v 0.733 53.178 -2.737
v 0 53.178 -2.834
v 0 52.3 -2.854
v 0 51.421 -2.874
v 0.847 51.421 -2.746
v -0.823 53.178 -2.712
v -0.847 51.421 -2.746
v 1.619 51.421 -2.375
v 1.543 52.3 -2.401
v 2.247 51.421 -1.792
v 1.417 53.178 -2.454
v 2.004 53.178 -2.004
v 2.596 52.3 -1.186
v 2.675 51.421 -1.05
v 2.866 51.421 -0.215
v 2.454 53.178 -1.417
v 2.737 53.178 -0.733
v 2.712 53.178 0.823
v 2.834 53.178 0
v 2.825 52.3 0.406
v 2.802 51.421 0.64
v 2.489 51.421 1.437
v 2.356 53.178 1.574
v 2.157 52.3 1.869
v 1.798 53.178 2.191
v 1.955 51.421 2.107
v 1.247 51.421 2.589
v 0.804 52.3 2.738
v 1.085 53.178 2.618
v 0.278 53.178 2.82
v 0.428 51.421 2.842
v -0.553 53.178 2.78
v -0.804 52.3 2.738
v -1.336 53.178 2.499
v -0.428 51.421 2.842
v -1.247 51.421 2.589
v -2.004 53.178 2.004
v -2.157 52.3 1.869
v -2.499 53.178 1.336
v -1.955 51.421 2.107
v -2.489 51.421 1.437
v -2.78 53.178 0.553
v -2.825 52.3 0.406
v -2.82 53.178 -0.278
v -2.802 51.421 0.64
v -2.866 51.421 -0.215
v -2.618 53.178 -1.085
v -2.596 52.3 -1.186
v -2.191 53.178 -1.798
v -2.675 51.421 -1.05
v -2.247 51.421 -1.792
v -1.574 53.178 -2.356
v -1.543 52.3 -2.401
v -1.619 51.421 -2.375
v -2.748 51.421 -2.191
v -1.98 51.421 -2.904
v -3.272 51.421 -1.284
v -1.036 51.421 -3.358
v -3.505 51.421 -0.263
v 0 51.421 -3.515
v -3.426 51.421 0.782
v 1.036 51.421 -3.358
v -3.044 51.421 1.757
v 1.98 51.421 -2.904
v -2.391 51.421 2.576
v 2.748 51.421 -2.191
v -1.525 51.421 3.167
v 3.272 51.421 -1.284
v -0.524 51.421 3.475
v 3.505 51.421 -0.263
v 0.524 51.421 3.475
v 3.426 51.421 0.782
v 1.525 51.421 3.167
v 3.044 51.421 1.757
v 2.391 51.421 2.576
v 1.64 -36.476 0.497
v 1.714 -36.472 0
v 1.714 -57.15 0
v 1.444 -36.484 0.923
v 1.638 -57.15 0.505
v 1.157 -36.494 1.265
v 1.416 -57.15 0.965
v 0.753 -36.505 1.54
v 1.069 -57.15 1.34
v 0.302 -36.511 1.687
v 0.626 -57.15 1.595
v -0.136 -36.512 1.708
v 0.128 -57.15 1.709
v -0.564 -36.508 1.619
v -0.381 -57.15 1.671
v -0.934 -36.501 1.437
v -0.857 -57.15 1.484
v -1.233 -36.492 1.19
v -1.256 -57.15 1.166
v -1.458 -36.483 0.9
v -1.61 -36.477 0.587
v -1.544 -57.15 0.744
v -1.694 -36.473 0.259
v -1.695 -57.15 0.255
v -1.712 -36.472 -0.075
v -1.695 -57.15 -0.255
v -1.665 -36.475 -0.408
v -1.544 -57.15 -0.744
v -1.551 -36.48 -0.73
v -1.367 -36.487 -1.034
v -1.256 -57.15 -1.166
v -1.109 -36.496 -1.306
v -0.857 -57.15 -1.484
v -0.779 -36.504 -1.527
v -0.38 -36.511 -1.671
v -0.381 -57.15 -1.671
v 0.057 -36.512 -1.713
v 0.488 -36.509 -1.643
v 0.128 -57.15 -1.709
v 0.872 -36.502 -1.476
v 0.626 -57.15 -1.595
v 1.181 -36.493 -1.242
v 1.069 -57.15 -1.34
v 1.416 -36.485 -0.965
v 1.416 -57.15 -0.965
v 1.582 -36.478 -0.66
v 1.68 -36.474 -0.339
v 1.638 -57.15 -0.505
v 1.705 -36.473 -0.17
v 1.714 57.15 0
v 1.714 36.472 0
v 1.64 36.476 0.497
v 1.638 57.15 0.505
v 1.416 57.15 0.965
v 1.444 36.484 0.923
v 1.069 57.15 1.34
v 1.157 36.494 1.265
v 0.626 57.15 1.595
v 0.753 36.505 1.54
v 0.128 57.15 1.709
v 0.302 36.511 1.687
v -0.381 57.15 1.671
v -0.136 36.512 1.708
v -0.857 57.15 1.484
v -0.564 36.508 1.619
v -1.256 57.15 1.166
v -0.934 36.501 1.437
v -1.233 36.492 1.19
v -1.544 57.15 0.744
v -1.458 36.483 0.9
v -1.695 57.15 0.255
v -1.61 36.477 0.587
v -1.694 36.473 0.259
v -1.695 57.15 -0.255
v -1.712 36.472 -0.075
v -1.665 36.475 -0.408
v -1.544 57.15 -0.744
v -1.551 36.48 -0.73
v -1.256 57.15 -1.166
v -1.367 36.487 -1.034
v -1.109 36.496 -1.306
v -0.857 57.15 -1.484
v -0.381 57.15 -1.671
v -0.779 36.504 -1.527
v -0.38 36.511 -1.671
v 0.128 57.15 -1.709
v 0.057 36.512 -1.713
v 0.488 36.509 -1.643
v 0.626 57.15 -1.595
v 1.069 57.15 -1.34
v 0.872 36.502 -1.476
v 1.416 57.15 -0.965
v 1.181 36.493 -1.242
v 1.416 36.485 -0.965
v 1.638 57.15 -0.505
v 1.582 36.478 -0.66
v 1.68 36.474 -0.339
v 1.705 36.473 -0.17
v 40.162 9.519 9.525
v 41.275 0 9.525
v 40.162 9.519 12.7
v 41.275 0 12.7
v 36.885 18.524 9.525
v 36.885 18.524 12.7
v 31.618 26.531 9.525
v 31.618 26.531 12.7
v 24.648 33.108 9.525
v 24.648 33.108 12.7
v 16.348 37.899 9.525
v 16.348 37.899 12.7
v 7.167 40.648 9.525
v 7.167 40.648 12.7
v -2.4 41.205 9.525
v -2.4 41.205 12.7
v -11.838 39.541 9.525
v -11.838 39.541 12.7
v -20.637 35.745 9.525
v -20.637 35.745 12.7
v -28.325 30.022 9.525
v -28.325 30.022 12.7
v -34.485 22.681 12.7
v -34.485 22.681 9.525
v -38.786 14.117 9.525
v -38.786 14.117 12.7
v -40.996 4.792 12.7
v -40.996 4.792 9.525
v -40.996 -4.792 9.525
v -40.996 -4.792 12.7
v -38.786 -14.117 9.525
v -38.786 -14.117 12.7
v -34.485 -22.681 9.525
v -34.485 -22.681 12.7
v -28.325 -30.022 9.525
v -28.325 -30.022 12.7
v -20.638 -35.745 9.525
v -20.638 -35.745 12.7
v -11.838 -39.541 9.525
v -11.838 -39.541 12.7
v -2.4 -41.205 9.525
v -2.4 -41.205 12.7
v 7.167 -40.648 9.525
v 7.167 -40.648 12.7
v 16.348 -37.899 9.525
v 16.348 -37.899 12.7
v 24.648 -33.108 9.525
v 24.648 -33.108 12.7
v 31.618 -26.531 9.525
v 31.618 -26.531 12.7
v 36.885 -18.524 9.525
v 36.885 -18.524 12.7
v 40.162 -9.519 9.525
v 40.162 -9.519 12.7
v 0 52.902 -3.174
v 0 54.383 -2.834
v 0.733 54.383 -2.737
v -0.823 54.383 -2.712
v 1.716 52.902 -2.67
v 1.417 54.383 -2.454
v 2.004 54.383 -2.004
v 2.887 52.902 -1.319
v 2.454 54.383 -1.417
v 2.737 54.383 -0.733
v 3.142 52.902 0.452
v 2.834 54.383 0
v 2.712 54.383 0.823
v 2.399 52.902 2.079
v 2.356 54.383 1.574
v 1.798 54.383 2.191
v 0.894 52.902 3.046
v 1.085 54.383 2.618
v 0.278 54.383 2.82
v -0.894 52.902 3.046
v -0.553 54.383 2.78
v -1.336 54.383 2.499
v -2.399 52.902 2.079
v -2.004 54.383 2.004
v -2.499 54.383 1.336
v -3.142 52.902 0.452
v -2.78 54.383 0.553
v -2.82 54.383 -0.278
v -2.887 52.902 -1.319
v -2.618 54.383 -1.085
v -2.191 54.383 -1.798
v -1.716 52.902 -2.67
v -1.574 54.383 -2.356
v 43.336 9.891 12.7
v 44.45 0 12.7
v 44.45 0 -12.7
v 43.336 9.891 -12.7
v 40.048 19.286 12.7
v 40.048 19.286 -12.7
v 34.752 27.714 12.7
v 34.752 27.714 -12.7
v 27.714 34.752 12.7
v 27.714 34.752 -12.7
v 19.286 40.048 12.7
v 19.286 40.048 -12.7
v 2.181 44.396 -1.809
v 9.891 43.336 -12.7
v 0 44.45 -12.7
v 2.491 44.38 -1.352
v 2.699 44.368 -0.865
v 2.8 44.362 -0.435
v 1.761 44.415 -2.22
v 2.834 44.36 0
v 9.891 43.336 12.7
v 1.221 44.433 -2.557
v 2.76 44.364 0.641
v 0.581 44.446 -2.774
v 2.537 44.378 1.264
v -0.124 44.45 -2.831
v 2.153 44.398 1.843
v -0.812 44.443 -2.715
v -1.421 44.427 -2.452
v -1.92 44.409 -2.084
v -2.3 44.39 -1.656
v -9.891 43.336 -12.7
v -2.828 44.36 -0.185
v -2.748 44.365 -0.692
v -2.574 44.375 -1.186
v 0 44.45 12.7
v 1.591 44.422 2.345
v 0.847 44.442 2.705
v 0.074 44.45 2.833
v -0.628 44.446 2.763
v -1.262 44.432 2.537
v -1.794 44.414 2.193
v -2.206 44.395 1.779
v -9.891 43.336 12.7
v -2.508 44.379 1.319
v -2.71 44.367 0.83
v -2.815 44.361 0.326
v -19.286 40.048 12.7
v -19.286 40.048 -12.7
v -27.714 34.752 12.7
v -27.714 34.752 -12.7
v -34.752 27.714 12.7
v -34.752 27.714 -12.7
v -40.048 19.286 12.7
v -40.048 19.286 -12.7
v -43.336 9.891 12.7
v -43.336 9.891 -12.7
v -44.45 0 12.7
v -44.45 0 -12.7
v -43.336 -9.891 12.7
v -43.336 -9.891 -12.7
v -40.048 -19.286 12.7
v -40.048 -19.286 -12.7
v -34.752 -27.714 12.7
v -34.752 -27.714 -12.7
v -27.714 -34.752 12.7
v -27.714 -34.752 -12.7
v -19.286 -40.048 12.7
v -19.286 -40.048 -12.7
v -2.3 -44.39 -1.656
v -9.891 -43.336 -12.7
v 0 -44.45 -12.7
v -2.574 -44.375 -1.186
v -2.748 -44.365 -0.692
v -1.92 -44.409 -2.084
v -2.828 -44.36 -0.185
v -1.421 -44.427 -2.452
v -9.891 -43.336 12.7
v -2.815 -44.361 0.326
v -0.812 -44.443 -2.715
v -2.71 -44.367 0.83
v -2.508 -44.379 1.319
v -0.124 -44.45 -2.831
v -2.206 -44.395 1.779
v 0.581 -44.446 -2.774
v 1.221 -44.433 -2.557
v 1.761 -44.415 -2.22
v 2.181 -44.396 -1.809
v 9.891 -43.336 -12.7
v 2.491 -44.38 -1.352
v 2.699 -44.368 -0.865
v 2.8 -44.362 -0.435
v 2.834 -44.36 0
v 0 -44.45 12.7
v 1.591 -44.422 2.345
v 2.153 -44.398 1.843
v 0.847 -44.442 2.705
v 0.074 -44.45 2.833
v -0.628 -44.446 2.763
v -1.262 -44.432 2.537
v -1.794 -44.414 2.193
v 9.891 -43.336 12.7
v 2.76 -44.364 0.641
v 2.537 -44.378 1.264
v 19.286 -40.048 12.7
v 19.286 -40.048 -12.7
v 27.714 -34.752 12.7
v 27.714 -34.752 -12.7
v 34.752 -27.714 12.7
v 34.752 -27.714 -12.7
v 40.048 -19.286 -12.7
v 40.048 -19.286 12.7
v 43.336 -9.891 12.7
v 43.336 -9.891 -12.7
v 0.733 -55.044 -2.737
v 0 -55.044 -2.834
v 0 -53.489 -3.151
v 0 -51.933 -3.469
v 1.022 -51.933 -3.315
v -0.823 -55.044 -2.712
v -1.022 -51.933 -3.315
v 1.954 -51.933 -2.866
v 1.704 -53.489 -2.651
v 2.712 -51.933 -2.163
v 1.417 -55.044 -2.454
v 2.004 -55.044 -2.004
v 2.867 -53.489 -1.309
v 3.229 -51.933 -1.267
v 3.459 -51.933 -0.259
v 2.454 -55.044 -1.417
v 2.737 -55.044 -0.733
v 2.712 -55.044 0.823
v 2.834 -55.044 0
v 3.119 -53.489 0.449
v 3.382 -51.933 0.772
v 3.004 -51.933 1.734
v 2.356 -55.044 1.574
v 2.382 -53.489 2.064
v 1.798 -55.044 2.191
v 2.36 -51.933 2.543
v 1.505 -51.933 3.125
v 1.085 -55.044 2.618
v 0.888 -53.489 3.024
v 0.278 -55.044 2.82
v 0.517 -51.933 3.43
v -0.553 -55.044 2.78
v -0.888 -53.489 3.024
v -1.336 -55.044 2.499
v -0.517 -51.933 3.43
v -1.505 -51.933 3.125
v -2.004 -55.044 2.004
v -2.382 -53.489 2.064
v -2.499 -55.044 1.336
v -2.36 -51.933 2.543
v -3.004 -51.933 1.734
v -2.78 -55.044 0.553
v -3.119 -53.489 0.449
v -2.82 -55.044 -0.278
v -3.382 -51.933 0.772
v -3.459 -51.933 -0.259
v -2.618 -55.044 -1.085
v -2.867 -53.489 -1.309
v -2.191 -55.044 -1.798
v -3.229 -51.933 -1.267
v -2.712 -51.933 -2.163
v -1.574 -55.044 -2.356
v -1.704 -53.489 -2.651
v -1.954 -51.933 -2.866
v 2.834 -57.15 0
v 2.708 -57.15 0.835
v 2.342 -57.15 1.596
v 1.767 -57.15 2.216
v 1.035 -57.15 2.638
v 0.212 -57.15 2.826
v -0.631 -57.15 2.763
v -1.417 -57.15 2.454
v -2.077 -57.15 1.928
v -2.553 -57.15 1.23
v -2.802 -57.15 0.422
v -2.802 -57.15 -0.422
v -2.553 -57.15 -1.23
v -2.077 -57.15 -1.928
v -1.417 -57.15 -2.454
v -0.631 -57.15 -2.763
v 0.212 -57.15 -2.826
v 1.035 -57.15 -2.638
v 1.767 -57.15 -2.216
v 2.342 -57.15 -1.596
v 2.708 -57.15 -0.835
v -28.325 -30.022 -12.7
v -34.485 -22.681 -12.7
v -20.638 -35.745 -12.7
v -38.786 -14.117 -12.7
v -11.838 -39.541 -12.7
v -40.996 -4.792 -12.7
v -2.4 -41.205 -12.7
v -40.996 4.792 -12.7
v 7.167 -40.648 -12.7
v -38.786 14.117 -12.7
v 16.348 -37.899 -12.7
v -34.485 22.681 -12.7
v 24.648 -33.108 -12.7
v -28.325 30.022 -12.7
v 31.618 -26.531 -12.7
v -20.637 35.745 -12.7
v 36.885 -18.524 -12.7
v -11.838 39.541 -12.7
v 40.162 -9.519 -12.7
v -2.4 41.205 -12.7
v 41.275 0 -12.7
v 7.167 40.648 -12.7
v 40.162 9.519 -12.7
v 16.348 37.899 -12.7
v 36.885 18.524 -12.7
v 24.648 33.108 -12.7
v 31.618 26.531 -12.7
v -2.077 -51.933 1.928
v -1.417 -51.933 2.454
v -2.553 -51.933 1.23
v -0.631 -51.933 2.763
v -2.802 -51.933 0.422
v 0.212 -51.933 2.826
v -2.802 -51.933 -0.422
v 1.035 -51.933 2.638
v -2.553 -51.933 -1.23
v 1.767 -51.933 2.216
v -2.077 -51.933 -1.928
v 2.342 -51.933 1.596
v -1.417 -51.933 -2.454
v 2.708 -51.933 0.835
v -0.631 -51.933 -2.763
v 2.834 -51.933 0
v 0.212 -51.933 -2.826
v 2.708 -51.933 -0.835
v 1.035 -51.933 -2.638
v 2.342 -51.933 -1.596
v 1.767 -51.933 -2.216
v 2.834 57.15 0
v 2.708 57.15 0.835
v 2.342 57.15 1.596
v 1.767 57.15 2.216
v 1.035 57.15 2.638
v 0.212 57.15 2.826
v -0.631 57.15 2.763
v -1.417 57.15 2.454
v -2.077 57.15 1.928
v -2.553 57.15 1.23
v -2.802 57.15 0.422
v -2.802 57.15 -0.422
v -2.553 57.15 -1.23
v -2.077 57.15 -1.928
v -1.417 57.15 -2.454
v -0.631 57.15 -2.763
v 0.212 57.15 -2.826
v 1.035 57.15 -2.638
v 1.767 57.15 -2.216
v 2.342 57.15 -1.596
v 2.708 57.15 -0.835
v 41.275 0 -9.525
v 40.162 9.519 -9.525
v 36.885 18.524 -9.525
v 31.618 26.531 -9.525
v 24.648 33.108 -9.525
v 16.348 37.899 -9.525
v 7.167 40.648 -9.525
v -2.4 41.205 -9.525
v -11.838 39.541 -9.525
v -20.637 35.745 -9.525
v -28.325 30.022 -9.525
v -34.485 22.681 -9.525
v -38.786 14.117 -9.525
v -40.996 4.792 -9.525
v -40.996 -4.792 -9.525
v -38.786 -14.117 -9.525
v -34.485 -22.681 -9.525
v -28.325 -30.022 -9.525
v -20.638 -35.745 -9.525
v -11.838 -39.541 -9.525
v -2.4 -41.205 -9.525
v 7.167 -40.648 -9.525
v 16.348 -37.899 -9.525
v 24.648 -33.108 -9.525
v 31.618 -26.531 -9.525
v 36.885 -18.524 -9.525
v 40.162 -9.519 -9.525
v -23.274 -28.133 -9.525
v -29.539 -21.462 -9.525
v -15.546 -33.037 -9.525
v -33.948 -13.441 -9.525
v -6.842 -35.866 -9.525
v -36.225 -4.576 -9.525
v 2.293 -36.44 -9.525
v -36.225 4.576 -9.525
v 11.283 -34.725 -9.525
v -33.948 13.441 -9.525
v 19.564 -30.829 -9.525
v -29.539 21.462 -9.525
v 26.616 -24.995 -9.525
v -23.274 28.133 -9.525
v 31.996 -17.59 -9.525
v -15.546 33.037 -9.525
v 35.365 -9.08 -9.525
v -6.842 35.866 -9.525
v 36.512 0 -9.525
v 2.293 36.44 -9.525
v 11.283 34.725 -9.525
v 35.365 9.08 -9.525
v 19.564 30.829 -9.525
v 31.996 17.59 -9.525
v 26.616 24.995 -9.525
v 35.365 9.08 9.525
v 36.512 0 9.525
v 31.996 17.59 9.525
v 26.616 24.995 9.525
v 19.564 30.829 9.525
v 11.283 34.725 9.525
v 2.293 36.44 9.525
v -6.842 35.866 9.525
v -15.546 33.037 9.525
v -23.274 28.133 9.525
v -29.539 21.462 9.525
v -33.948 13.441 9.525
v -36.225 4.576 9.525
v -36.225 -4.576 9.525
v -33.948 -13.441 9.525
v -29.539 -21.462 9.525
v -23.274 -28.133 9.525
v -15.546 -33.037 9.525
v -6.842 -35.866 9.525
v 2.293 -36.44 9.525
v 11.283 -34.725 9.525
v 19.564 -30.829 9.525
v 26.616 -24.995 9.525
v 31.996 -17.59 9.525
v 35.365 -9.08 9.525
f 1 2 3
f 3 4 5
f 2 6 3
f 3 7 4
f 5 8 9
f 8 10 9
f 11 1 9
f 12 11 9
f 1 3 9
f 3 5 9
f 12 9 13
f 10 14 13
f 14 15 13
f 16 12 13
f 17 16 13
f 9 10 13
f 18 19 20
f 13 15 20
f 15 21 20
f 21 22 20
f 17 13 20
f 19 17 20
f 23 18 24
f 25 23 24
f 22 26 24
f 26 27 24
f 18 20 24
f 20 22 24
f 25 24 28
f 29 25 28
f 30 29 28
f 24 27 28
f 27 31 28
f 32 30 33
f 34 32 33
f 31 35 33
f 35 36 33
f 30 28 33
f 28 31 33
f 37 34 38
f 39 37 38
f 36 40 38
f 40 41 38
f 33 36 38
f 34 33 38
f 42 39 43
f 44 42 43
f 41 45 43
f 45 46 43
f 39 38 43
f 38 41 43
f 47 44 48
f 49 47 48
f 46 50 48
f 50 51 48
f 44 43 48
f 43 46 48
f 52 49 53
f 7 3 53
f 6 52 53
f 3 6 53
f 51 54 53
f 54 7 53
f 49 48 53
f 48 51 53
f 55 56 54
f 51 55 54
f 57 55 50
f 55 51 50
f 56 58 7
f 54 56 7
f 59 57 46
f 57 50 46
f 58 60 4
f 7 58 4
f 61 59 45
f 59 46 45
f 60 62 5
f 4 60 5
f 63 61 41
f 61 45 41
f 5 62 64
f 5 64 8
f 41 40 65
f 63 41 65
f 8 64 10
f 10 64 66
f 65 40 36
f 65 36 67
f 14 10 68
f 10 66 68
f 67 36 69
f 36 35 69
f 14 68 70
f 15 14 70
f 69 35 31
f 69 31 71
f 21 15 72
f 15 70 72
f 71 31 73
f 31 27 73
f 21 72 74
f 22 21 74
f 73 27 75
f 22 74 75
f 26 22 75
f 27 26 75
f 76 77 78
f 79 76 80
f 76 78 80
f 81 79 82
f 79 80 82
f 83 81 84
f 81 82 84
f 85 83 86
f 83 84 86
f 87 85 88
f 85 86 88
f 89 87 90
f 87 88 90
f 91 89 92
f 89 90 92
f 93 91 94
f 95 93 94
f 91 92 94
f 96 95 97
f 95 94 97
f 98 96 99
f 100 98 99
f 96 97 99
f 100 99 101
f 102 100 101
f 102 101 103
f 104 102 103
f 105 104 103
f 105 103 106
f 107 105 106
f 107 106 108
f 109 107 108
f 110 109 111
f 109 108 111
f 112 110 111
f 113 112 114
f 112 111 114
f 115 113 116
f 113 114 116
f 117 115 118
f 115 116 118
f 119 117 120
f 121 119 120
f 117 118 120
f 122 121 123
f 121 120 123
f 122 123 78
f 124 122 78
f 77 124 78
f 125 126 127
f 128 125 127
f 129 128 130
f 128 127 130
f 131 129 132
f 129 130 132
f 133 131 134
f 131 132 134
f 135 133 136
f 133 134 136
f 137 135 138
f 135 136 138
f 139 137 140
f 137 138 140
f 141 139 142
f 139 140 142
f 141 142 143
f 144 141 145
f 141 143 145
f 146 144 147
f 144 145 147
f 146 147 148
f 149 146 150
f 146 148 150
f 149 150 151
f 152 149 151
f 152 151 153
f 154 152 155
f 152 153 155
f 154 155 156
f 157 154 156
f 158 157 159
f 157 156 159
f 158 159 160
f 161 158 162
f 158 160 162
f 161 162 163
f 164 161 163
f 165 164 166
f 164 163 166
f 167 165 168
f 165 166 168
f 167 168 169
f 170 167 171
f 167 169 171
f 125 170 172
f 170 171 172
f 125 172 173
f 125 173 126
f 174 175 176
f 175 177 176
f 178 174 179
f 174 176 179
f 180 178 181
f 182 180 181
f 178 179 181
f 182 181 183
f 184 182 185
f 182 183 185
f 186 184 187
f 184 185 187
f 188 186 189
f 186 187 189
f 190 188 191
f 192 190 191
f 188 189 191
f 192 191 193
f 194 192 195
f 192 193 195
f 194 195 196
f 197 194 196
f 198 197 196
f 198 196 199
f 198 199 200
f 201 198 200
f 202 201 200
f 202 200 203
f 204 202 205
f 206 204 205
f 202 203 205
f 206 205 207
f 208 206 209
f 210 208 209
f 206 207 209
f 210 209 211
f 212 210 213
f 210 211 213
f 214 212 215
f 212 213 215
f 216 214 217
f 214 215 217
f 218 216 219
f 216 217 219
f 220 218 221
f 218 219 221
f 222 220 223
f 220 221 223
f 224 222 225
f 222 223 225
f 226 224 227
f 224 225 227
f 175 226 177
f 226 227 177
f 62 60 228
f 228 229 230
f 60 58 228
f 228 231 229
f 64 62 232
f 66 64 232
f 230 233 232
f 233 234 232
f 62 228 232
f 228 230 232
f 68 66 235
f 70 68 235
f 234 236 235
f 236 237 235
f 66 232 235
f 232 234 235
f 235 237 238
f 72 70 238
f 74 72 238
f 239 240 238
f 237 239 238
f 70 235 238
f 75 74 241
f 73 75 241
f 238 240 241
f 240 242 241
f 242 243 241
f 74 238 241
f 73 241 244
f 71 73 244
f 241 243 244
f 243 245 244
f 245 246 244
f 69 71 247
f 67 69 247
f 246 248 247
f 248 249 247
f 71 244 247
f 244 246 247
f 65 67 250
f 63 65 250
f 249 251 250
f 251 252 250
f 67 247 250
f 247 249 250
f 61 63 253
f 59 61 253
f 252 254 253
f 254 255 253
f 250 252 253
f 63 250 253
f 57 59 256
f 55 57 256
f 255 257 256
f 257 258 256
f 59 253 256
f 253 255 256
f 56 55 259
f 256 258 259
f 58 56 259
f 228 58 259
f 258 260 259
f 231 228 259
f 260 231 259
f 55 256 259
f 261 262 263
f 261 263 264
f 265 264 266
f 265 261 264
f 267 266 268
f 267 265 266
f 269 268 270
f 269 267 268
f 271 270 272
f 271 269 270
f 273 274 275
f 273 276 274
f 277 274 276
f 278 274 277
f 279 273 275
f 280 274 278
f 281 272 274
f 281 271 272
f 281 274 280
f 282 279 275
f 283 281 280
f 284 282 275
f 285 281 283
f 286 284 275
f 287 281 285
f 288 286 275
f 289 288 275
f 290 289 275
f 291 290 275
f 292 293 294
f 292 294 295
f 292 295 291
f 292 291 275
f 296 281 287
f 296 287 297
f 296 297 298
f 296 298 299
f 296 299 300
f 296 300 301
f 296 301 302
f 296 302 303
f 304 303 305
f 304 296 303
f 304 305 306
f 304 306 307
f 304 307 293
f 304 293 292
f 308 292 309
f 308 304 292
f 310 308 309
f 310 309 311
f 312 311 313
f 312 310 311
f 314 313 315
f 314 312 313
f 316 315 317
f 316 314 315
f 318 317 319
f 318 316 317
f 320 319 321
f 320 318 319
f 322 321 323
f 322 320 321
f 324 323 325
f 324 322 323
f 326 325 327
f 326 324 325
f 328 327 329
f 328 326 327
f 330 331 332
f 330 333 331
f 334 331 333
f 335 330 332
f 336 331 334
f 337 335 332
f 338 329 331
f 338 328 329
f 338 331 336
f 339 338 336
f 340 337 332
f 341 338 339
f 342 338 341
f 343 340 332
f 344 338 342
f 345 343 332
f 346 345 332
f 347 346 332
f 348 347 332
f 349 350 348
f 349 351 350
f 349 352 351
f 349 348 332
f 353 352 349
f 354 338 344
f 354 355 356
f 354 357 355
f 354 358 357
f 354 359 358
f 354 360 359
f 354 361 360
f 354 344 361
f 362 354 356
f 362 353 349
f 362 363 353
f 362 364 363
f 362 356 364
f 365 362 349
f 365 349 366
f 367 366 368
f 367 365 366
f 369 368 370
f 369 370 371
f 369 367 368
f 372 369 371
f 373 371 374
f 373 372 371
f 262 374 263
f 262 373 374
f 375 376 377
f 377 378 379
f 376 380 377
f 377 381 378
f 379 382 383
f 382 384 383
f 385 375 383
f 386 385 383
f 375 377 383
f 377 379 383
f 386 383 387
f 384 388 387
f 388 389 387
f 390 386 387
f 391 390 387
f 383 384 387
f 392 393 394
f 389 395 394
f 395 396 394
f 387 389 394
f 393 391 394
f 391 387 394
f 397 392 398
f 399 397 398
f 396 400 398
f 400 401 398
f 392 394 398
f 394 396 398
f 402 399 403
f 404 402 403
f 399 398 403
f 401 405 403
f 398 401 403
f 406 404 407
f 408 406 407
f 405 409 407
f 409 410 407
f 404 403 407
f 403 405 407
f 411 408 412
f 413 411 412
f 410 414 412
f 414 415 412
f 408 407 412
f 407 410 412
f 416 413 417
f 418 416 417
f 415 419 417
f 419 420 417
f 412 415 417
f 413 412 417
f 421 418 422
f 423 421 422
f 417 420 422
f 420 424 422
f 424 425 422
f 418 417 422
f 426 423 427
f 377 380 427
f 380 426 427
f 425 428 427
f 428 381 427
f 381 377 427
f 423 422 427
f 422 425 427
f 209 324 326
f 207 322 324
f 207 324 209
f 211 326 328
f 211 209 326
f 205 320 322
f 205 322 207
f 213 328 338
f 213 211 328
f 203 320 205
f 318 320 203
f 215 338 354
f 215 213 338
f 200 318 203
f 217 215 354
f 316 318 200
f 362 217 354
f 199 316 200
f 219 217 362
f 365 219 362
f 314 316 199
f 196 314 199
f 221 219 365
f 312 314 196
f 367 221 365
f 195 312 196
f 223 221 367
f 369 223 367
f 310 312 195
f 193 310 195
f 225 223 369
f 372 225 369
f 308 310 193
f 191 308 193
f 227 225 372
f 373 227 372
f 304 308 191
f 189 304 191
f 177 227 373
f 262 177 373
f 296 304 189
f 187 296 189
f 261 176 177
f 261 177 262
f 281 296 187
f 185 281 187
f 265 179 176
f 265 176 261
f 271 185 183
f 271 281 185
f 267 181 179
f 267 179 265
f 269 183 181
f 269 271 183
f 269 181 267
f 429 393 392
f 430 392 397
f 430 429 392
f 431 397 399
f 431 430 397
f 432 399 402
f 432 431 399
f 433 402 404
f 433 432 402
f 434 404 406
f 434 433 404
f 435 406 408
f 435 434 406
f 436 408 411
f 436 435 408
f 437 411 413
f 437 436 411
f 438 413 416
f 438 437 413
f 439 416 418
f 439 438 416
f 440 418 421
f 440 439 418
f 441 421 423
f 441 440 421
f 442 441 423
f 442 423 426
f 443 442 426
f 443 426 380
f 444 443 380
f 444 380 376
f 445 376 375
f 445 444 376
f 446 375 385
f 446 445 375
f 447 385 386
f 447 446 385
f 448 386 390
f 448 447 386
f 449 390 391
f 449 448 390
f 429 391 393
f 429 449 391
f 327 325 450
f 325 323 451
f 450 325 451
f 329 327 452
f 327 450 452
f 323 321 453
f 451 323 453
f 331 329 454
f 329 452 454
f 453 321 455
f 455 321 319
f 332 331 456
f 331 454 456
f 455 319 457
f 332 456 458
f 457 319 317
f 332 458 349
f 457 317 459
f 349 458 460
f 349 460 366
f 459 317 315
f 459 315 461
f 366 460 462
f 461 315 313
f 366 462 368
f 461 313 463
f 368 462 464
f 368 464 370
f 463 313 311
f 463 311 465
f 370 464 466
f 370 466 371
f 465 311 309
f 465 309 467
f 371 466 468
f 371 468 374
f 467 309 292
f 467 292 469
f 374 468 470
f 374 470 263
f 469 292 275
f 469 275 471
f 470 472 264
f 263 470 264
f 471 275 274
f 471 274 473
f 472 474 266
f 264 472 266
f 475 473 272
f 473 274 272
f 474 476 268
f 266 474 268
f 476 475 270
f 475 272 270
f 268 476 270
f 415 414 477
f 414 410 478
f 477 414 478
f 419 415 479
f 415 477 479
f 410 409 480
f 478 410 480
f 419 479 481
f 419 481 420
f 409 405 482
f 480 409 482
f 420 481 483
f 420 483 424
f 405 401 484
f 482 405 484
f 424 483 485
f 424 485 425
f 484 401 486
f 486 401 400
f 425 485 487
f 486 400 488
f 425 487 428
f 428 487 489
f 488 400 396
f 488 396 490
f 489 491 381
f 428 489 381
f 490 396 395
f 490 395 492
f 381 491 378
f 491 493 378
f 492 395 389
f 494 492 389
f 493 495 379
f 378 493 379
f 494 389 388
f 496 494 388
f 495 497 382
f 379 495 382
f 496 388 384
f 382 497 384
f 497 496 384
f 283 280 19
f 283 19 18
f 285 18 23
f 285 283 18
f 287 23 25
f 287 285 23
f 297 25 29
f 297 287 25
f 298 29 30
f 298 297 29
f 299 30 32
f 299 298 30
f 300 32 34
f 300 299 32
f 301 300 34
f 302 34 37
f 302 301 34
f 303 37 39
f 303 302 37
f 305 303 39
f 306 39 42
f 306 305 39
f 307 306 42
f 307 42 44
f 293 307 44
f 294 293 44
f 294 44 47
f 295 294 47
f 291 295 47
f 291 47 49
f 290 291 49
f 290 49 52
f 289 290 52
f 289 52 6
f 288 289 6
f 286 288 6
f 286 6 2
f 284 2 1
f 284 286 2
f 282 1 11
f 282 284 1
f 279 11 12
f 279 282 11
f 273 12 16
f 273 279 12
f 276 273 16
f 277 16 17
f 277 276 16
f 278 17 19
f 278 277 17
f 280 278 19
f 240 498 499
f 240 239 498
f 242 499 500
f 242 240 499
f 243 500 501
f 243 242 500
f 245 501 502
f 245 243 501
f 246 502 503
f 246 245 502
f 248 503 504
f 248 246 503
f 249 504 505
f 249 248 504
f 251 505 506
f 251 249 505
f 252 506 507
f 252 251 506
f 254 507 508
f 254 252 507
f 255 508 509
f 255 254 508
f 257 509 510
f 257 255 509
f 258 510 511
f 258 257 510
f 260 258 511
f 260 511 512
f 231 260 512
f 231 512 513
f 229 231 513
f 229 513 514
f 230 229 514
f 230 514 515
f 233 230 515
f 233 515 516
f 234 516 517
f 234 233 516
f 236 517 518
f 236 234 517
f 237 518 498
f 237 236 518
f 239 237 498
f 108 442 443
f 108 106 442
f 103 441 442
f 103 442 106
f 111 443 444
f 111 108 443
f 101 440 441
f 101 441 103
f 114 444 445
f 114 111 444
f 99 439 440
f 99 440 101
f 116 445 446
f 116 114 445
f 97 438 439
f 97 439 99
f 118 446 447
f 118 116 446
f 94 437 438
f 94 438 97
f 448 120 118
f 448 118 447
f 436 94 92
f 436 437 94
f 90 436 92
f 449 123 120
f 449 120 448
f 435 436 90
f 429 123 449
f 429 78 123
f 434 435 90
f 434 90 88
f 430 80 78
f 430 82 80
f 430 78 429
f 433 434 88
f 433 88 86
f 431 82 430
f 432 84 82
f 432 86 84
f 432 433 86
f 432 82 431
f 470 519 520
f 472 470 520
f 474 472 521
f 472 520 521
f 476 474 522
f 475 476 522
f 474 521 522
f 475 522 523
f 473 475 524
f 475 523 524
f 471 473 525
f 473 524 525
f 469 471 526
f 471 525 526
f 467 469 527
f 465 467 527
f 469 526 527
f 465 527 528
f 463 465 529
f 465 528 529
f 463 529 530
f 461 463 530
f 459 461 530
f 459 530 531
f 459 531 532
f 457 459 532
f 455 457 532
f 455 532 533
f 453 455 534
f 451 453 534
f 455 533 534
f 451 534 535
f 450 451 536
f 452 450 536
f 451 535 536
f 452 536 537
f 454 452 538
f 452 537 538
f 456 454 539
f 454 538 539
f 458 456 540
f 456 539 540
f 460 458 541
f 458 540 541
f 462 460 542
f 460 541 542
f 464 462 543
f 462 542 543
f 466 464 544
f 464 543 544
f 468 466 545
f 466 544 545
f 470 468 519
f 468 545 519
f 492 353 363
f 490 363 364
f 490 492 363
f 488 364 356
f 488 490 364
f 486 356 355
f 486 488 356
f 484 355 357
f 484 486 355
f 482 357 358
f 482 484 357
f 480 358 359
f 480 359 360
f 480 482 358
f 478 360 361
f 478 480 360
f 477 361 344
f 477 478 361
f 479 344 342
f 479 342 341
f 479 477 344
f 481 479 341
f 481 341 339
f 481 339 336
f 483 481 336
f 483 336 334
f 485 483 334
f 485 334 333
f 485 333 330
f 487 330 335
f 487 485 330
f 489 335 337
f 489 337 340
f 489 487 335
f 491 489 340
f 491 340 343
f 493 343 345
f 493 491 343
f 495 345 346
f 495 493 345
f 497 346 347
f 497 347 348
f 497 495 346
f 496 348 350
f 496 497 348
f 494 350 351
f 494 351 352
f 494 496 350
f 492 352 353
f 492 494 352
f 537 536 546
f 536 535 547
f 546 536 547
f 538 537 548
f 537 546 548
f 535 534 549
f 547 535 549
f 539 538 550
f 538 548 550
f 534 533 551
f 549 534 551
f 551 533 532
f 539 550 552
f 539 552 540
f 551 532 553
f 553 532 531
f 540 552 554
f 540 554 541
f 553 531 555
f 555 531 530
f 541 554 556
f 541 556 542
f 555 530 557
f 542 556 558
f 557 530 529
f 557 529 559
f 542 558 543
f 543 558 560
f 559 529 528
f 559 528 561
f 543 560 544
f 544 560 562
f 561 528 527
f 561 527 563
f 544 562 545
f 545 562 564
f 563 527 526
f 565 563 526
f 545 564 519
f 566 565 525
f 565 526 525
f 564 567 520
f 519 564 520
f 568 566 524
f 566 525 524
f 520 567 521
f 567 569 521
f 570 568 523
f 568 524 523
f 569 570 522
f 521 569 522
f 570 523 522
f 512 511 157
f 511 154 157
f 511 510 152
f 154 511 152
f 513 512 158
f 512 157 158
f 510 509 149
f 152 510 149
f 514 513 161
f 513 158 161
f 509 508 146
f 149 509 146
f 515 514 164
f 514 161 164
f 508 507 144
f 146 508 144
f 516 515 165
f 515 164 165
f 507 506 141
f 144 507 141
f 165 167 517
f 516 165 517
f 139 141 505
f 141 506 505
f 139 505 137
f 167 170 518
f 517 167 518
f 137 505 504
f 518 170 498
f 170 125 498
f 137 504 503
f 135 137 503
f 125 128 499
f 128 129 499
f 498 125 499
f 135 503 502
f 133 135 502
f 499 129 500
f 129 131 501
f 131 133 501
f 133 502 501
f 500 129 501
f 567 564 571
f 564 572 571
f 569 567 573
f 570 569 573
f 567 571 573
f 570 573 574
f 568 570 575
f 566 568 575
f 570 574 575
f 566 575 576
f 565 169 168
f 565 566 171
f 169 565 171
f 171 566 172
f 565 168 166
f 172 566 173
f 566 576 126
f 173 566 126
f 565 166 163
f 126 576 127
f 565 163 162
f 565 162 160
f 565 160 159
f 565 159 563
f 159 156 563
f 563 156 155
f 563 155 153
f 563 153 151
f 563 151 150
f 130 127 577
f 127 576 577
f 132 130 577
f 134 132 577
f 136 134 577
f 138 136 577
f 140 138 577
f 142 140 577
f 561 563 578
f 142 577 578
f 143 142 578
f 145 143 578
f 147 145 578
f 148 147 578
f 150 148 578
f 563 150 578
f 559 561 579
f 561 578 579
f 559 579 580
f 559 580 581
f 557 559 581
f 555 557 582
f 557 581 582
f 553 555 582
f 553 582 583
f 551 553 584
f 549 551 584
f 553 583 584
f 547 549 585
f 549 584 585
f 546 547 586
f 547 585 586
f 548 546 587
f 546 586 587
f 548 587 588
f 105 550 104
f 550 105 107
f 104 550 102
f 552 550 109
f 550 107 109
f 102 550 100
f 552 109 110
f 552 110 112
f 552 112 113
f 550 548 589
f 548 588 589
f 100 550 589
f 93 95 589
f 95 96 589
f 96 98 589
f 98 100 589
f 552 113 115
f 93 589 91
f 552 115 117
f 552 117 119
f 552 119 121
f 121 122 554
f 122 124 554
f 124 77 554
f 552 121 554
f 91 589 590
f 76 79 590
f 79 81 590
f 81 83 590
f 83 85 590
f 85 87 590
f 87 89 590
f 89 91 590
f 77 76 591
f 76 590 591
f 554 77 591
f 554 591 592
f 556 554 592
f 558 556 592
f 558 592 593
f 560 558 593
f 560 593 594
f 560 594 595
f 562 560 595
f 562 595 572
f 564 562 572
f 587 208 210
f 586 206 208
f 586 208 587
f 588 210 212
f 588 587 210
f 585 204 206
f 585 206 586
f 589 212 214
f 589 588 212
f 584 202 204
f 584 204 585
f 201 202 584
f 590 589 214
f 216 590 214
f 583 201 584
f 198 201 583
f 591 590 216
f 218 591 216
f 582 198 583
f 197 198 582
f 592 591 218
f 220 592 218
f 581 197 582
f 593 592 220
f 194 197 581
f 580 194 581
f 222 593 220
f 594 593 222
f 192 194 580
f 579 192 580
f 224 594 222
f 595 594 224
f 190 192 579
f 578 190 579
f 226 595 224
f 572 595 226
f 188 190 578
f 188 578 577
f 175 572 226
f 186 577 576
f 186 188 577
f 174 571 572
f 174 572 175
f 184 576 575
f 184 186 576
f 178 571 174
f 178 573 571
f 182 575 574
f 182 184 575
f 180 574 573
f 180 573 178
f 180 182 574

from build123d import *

# Parameters (mm, degrees)
F0_R      = 44.45
F1_DEPTH  = 12.7
F2_R      = 41.275
F3_DEPTH  = 12.7
F4_R      = 41.275
F5_DEPTH  = 9.525
F7_R      = 2.833981
F8_DEPTH  = 57.15
F11_R     = 1.713895
F12_DEPTH = 57.15
F6_R      = 36.5125
F15_DEPTH = 12.7


with BuildPart() as f1:
    # F0 (on Top) → F1 (new body, symmetric)
    with BuildSketch(Plane.XY):
        Circle(F0_R)
    extrude(amount=F1_DEPTH, both=True)

    # F2 (on Top) → F3 (cut, symmetric)
    with BuildSketch(Plane.XY):
        Circle(F2_R)
    extrude(amount=F3_DEPTH, both=True, mode=Mode.SUBTRACT)

    # F4 (on Top) → F5 (join, symmetric)
    with BuildSketch(Plane.XY):
        Circle(F4_R)
    extrude(amount=F5_DEPTH, both=True)

    # F7 (on Front) → F8 (join, symmetric)
    with BuildSketch(Plane.XZ):
        Circle(F7_R)
    extrude(amount=F8_DEPTH, both=True)

    # F9 (on Right) → F10 (revolve)
    with BuildSketch(Plane.YZ):
        Polygon((-51.933423, -2.833975), (-55.044275, -2.833975), (-51.933423, -3.468975), align=None)
    revolve(axis=Axis((0, -57.15, 0), (0, -1, 0)))

    # F11 (on Front) → F12 (cut, symmetric)
    with BuildSketch(Plane.XZ):
        Circle(F11_R)
    extrude(amount=F12_DEPTH, both=True, mode=Mode.SUBTRACT)

    # F13 (on Right) → F14 (revolve)
    with BuildSketch(Plane.YZ):
        Polygon((51.421318, -3.514614), (54.515656, -2.803493), (51.421318, -2.874012), align=None)
    revolve(axis=Axis((0, 57.15, 0), (0, -1, 0)))

    # F6 (on Top) → F15 (cut, symmetric)
    with BuildSketch(Plane.XY):
        Circle(F6_R)
    extrude(amount=F15_DEPTH, both=True, mode=Mode.SUBTRACT)


solid = f1.part
